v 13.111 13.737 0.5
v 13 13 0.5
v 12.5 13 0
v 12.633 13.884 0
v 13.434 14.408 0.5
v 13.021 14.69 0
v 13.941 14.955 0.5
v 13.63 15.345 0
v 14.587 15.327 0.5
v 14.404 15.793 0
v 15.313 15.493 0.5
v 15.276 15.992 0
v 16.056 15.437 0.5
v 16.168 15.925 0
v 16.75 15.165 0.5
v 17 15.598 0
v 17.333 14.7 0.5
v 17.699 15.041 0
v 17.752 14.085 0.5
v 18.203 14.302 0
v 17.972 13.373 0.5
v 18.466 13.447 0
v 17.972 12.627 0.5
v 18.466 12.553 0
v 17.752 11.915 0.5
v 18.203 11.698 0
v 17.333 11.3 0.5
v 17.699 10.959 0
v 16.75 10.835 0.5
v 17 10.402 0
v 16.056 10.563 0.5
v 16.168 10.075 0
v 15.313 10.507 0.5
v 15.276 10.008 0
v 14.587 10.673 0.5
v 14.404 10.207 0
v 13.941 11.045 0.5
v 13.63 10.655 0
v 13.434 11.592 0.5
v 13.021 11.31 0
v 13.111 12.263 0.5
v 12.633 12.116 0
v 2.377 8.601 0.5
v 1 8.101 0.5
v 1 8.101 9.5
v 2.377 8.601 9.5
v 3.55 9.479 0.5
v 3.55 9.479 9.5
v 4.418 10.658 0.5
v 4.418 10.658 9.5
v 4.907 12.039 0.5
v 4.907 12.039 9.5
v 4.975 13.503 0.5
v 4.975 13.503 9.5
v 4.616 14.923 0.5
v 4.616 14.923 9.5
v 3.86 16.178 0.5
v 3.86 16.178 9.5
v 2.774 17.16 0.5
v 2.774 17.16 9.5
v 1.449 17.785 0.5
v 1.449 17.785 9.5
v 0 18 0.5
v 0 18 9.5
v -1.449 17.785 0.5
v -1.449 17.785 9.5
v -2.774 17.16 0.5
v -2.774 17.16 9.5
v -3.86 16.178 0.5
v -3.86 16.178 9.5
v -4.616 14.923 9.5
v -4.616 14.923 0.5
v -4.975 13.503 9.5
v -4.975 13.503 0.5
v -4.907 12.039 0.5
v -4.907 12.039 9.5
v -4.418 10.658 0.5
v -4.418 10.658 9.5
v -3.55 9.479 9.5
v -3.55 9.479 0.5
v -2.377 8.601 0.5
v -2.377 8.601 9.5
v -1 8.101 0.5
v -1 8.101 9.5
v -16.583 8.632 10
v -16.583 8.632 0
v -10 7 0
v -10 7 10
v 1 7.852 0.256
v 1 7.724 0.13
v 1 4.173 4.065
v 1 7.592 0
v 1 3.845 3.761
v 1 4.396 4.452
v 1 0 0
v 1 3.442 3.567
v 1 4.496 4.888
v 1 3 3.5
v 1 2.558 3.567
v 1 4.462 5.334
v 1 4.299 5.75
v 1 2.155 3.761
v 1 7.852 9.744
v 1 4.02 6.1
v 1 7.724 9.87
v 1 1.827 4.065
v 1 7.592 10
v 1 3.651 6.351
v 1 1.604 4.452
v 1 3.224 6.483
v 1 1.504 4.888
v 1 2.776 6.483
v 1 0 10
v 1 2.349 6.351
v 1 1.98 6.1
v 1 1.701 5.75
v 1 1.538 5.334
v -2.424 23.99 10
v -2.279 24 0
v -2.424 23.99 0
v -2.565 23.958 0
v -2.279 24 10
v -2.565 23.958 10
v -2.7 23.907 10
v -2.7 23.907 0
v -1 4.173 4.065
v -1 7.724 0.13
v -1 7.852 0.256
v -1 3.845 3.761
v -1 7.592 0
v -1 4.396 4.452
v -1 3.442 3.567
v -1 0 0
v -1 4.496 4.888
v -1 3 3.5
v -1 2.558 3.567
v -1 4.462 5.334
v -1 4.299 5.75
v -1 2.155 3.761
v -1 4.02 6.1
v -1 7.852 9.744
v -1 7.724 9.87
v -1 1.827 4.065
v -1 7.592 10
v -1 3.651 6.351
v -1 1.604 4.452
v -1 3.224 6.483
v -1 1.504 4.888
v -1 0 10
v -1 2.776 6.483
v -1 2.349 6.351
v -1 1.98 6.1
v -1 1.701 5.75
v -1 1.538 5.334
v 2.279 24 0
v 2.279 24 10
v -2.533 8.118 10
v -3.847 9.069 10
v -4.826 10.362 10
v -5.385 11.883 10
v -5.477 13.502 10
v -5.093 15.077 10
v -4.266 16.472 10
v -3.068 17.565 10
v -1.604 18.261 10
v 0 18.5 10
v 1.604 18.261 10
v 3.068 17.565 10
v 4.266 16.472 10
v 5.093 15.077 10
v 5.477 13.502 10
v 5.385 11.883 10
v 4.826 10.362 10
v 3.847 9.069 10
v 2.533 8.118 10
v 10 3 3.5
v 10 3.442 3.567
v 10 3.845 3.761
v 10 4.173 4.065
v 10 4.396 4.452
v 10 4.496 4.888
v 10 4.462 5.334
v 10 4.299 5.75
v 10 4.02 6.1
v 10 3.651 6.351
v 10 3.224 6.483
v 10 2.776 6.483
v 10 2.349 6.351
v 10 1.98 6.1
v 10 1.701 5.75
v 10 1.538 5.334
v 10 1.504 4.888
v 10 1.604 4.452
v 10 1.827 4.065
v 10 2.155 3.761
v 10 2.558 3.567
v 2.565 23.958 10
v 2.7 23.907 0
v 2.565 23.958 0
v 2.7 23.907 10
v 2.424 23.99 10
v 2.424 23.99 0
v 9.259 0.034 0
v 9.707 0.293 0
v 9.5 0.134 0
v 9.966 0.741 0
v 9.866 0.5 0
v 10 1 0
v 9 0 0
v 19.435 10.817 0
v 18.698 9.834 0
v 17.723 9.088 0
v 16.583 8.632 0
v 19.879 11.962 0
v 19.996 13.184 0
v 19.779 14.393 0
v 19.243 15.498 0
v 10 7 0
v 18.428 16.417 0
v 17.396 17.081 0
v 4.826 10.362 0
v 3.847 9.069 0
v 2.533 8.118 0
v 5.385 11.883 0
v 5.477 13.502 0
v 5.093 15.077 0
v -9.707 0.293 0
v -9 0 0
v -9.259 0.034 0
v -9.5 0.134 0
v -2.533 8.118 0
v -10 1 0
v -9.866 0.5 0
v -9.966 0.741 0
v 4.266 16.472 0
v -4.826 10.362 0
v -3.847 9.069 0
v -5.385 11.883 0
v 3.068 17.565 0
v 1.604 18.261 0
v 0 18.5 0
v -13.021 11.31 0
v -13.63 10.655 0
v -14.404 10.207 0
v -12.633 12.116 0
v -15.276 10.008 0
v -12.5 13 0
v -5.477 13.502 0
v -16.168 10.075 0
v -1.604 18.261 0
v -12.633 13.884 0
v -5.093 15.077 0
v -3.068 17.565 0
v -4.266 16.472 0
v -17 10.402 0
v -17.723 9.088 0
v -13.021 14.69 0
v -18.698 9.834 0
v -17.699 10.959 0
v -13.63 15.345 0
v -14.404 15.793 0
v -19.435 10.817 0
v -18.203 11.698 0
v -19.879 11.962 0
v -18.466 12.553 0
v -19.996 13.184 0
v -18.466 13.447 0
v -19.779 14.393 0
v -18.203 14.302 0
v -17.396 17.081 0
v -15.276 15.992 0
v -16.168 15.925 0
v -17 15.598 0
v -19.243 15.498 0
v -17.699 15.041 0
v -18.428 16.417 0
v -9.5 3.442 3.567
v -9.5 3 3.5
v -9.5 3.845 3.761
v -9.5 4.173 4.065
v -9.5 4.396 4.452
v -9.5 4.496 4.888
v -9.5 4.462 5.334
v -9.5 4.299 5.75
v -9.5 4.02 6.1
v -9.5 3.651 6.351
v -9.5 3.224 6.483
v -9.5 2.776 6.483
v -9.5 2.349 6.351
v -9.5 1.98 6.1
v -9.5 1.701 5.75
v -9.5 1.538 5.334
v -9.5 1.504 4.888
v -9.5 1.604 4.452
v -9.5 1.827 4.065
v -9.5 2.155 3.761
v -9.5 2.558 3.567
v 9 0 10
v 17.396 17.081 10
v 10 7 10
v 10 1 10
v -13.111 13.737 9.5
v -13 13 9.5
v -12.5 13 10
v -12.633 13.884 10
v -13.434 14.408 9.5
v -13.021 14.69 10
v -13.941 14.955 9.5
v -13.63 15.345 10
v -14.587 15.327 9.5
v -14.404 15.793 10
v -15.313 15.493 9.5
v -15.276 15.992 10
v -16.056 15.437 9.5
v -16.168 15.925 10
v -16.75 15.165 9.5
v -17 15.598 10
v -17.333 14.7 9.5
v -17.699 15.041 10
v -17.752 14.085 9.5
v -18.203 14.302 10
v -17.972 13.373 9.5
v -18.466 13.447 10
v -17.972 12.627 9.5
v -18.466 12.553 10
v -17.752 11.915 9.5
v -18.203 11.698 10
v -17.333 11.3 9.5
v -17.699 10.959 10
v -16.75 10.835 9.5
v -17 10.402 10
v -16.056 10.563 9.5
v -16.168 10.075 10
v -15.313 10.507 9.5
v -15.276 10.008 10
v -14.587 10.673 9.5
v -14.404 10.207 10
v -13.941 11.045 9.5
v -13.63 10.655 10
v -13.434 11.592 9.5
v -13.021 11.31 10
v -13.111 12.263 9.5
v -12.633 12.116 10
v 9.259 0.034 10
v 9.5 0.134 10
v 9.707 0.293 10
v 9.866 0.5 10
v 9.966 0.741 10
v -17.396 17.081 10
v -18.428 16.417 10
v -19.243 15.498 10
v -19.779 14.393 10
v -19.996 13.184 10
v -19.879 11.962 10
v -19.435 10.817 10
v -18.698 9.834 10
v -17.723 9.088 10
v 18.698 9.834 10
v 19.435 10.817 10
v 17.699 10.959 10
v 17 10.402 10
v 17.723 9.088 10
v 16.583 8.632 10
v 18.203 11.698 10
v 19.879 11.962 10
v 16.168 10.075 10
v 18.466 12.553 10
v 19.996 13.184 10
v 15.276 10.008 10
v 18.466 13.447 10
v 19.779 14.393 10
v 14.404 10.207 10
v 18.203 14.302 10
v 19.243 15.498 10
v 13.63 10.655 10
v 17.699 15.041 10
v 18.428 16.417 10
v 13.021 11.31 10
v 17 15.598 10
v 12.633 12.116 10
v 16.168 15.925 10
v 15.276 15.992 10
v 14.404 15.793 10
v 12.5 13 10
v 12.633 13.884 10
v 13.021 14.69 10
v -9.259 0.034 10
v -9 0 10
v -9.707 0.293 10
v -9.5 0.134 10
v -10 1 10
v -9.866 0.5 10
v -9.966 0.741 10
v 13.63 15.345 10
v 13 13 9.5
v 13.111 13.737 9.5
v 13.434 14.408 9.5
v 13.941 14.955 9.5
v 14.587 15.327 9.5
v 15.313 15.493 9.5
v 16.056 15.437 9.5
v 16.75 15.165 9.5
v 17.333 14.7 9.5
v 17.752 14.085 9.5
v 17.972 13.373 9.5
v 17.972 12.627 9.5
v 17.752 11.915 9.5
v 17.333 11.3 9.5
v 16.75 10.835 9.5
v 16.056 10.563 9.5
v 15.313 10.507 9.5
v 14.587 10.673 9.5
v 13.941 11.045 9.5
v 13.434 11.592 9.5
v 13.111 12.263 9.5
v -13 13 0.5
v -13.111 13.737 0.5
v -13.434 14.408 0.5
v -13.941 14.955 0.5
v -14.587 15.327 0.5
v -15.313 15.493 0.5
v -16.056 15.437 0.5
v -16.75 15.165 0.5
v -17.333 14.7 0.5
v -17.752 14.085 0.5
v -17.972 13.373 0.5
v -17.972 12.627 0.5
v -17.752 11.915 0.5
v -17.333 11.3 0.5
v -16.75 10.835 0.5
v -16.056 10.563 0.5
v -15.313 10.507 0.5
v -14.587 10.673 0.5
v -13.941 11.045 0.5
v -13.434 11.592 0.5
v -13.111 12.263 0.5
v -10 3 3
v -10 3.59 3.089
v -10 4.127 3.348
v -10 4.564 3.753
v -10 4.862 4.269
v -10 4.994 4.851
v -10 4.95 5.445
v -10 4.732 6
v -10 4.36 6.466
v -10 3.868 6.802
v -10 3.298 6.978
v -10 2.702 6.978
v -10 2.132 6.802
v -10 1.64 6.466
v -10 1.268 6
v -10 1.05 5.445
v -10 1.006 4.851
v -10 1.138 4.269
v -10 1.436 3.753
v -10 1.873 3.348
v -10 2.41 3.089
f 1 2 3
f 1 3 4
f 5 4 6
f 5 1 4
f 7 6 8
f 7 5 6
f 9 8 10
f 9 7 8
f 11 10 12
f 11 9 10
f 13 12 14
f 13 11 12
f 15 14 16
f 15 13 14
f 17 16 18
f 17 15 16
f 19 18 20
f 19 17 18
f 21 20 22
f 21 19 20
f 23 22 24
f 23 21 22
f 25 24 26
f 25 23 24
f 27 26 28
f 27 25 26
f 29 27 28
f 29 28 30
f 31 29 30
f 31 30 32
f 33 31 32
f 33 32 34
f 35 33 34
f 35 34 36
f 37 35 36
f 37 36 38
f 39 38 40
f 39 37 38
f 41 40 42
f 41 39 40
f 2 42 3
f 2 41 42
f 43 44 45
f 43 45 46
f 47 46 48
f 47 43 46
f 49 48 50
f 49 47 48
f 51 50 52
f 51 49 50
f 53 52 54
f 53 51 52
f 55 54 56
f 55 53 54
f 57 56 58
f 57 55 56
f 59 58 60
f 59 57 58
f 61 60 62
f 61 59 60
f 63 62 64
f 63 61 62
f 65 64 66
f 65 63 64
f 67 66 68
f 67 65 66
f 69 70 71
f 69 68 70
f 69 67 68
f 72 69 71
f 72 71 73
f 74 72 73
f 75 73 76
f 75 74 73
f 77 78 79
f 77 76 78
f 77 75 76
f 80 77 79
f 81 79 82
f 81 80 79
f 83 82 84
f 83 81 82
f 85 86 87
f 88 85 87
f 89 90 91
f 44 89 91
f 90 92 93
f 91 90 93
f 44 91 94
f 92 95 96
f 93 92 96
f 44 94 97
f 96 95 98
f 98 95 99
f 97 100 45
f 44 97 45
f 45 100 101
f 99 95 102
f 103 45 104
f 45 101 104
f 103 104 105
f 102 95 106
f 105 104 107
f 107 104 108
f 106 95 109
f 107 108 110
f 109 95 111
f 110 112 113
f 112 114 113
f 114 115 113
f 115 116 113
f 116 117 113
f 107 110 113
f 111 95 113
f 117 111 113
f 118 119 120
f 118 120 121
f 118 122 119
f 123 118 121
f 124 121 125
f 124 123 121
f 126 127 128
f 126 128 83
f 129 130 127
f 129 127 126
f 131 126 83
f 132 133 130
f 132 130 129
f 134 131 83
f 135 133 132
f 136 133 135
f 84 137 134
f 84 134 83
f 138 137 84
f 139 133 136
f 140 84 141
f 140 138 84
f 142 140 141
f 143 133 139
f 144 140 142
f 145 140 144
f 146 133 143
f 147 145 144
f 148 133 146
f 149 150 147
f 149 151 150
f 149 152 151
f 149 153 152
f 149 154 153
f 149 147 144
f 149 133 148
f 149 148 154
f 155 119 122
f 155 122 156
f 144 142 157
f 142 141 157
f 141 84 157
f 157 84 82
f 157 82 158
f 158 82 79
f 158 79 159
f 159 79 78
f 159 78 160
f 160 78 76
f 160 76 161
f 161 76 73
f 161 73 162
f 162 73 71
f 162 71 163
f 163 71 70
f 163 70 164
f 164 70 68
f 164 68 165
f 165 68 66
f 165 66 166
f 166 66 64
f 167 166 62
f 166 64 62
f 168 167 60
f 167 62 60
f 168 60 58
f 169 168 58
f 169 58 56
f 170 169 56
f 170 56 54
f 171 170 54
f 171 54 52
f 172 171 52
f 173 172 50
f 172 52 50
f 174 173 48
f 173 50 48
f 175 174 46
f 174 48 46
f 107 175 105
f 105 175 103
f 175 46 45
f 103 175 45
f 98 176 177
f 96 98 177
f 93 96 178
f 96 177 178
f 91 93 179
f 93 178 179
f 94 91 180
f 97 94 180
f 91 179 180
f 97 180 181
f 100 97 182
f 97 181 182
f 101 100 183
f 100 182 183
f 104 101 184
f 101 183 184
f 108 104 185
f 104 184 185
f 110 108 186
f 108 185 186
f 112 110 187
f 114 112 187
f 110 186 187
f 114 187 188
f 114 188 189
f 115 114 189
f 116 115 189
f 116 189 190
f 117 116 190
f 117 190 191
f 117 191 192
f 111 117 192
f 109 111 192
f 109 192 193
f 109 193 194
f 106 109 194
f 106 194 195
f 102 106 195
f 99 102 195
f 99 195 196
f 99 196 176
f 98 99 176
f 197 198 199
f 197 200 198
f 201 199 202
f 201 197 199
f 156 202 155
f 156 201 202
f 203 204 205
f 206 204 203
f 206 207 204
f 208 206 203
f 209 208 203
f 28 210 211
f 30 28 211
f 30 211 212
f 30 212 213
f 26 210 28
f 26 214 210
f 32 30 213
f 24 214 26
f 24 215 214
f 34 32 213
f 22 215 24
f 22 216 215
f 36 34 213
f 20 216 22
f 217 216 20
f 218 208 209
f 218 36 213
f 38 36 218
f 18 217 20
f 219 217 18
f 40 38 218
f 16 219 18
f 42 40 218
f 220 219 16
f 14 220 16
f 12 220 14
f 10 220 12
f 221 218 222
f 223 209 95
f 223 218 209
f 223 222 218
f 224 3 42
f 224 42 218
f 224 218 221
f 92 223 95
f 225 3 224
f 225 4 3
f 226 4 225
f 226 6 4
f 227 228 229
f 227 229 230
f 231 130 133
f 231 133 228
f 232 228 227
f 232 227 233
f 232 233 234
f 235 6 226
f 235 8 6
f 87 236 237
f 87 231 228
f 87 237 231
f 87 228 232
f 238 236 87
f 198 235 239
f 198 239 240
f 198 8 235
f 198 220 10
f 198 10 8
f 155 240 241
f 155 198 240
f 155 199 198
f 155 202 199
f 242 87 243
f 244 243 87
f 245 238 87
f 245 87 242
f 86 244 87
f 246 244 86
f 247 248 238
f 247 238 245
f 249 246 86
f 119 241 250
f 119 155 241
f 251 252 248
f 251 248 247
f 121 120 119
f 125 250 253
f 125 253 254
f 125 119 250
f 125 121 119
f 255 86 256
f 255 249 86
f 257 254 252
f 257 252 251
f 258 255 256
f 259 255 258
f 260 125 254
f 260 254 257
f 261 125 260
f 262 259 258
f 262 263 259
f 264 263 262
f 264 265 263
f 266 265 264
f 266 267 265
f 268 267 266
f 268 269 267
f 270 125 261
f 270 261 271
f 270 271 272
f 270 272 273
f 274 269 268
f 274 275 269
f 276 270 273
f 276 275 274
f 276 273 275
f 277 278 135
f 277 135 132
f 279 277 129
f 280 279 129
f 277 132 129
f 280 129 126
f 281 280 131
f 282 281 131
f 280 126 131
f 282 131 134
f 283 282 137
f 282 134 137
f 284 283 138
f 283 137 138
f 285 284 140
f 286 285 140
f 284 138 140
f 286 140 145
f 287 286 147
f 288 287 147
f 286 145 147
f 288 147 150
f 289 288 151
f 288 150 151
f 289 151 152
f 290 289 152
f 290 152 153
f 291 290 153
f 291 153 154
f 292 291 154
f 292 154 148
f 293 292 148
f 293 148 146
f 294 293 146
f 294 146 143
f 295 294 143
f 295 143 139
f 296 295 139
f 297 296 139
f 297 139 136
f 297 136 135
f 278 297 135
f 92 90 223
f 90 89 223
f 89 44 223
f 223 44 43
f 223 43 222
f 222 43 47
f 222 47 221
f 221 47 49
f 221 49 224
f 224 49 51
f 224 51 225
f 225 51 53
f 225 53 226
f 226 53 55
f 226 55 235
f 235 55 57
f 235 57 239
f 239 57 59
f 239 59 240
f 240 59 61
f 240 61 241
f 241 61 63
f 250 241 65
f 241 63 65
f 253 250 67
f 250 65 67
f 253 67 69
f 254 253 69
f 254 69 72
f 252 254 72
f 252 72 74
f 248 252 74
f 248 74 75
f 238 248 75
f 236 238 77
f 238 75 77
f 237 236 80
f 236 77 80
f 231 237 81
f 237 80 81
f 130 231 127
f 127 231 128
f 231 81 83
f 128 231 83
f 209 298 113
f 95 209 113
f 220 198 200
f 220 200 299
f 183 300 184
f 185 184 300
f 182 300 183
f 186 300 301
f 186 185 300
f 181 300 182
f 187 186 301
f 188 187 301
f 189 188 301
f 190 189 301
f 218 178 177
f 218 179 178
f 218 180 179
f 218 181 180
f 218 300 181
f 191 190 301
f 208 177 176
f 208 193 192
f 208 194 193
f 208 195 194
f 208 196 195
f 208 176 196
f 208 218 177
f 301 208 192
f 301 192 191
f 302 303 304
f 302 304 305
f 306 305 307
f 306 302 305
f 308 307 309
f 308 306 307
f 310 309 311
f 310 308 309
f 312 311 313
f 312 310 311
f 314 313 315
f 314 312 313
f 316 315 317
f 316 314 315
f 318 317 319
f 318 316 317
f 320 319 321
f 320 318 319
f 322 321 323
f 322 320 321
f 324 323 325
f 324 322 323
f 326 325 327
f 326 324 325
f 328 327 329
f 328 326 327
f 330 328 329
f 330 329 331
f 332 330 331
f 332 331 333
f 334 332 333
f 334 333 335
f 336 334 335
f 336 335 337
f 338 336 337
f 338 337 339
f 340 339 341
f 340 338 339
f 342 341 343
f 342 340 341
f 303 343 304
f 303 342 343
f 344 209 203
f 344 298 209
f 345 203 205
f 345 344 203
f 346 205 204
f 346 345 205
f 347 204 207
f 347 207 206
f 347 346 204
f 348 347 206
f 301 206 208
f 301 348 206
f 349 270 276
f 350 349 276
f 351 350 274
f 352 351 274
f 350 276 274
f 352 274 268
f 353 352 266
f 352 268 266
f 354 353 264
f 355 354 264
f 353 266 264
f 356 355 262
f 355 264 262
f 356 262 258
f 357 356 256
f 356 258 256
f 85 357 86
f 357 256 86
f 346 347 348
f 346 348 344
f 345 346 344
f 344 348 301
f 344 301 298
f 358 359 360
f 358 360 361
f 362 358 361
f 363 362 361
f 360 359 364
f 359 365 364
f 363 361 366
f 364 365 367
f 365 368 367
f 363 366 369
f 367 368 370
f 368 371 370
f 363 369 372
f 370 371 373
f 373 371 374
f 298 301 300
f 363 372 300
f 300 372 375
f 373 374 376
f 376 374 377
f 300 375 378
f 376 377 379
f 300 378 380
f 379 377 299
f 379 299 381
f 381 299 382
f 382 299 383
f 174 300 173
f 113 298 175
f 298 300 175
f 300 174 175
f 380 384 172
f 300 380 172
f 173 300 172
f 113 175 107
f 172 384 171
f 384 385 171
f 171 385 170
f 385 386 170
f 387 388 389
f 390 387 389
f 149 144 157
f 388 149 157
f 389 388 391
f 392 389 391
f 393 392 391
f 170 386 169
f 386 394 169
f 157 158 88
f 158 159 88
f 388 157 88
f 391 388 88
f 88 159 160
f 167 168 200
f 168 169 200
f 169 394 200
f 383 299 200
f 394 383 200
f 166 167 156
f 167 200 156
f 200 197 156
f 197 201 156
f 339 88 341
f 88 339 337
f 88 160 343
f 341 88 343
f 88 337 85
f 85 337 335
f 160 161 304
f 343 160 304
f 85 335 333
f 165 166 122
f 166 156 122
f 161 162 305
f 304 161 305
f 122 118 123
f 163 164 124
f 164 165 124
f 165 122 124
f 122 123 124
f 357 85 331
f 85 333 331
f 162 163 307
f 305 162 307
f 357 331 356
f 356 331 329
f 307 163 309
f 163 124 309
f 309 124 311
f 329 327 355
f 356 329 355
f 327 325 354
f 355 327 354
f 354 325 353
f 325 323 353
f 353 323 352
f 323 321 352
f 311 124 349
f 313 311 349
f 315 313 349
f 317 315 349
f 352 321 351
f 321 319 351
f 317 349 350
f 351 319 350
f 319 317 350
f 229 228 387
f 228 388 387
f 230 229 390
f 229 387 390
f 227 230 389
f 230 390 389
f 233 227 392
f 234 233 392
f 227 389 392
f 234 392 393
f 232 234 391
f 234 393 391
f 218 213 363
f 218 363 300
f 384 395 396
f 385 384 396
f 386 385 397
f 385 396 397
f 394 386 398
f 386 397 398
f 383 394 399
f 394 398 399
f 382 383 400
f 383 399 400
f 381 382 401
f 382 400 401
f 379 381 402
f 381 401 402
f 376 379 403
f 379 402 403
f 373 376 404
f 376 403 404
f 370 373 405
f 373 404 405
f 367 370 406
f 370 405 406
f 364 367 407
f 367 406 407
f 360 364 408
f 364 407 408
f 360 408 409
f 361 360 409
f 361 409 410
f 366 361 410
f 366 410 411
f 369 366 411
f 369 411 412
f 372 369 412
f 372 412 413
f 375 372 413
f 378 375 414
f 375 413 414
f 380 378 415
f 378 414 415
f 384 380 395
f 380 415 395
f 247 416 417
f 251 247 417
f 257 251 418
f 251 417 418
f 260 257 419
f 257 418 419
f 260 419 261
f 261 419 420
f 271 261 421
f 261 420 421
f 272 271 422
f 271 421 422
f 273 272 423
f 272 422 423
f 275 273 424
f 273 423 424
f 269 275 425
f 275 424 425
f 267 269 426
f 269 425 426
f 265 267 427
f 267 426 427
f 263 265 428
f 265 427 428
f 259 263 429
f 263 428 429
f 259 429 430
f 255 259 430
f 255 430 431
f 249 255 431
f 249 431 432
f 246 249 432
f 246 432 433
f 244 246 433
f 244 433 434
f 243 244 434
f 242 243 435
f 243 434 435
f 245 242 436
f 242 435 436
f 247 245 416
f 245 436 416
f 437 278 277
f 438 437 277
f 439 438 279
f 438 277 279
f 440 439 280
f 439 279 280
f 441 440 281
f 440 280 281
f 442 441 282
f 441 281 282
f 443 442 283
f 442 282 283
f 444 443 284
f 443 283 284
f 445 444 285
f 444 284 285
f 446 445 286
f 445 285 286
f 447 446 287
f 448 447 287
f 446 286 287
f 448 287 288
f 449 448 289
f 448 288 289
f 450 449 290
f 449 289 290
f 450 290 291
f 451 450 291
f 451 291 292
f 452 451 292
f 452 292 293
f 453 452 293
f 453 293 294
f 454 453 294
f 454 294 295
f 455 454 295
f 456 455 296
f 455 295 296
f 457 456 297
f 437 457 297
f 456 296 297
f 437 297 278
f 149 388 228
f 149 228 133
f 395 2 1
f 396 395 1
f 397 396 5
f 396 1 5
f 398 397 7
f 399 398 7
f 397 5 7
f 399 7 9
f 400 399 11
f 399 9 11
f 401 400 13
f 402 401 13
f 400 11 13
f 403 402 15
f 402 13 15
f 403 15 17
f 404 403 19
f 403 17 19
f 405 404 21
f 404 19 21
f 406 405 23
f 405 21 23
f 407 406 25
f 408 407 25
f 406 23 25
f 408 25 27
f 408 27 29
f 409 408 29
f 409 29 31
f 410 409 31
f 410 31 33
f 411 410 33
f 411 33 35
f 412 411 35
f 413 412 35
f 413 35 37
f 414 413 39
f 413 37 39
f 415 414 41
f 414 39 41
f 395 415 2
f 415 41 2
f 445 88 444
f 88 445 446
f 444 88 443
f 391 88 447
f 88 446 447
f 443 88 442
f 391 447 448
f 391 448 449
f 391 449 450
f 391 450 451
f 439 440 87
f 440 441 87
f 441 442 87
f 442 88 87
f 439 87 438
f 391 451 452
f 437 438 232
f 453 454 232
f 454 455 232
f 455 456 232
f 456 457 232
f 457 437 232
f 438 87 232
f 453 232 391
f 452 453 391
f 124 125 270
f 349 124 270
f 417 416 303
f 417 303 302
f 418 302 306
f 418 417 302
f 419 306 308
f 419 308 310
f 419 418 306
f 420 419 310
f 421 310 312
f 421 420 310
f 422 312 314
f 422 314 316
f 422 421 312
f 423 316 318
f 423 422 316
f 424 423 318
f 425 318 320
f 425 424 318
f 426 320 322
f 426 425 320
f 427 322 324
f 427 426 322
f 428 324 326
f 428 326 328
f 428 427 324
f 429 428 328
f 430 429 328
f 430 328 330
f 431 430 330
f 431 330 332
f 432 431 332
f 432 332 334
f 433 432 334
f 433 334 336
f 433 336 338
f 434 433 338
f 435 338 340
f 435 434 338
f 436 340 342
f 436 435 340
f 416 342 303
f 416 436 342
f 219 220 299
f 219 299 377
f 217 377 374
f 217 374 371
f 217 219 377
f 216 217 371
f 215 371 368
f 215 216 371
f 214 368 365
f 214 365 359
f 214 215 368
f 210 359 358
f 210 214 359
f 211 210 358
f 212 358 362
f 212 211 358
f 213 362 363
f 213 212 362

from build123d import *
from build123d.topology import SkipClean

# Parameters (mm, degrees)
SKETCH_1_R          = 2.5
EXTRUDE_1_DEPTH     = 10
SKETCH_2_W          = 2
SKETCH_2_H          = 10
CUT_EXTRUDE_1_DEPTH = 10
SKETCH_3_R          = 1.5
CUT_EXTRUDE_2_DEPTH = 40.698866483
CHAMFER_1_SIZE      = 0.5
FILLET_1_R          = 1


with BuildPart() as part:
    # 草图1 → 凸台-拉伸1 (new body)
    with BuildSketch(Plane.XY):
        with BuildLine():
            Line((0, 0), (0, 8))
            ThreePointArc((0, 8), (-5, 13), (0, 18))
            Line((0, 18), (0, 24))
            Line((0, 24), (-2.5, 24))
            Line((-2.5, 24), (-17.395659833, 17.081234348))
            ThreePointArc((-17.395659833, 17.081234348), (-19.979326925, 12.569151657), (-16.582987314, 8.632261629))
            Line((-16.582987314, 8.632261629), (-10, 7))
            Line((-10, 7), (-10, 0))
            Line((-10, 0), (0, 0))
        make_face()
        with Locations((-15.5, 13)):
            Circle(SKETCH_1_R, mode=Mode.SUBTRACT)
    extrude_1 = extrude(amount=EXTRUDE_1_DEPTH)

    # 镜向1: 凸台-拉伸1 across plane
    with SkipClean():  # the faces are left unmerged after this step: merging them gives an invalid solid
        add(extrude_1.mirror(Plane(origin=(0, 18, 10), x_dir=(0, 0, 1), z_dir=(-1, 0, 0))))

    # 草图2 → 切除-拉伸1 (cut)
    with BuildSketch(Plane.XZ):
        with Locations((0, 5)):
            Rectangle(SKETCH_2_W, SKETCH_2_H)
    extrude(amount=-CUT_EXTRUDE_1_DEPTH, mode=Mode.SUBTRACT)

    # 草图3 → 切除-拉伸2 (cut, through all)
    with BuildSketch(Plane(origin=(10, 0, 0), x_dir=(0, 0, -1), z_dir=(1, 0, 0))):
        with Locations((-5, 3)):
            Circle(SKETCH_3_R)
    extrude(amount=-CUT_EXTRUDE_2_DEPTH, mode=Mode.SUBTRACT)

    # 倒角1
    chamfer_1_edges = [part.edges().sort_by_distance(p)[0] for p in [
        (-18, 13, 0),
        (-18, 13, 10),
        (18, 13, 10),
        (18, 13, 0),
        (0, 18, 0),
        (0, 18, 10),
        (-10, 3, 6.5),
    ]]
    chamfer(chamfer_1_edges, length=CHAMFER_1_SIZE)

    # 圆角1
    fillet_1_edges = [part.edges().sort_by_distance(p)[0] for p in [
        (-10, 0, 5),
        (-2.5, 24, 5),
        (10, 0, 5),
        (2.5, 24, 5),
    ]]
    fillet(fillet_1_edges, radius=FILLET_1_R - 0.0001)  # a hair under: the kernel refuses the full size


solid = part.part
